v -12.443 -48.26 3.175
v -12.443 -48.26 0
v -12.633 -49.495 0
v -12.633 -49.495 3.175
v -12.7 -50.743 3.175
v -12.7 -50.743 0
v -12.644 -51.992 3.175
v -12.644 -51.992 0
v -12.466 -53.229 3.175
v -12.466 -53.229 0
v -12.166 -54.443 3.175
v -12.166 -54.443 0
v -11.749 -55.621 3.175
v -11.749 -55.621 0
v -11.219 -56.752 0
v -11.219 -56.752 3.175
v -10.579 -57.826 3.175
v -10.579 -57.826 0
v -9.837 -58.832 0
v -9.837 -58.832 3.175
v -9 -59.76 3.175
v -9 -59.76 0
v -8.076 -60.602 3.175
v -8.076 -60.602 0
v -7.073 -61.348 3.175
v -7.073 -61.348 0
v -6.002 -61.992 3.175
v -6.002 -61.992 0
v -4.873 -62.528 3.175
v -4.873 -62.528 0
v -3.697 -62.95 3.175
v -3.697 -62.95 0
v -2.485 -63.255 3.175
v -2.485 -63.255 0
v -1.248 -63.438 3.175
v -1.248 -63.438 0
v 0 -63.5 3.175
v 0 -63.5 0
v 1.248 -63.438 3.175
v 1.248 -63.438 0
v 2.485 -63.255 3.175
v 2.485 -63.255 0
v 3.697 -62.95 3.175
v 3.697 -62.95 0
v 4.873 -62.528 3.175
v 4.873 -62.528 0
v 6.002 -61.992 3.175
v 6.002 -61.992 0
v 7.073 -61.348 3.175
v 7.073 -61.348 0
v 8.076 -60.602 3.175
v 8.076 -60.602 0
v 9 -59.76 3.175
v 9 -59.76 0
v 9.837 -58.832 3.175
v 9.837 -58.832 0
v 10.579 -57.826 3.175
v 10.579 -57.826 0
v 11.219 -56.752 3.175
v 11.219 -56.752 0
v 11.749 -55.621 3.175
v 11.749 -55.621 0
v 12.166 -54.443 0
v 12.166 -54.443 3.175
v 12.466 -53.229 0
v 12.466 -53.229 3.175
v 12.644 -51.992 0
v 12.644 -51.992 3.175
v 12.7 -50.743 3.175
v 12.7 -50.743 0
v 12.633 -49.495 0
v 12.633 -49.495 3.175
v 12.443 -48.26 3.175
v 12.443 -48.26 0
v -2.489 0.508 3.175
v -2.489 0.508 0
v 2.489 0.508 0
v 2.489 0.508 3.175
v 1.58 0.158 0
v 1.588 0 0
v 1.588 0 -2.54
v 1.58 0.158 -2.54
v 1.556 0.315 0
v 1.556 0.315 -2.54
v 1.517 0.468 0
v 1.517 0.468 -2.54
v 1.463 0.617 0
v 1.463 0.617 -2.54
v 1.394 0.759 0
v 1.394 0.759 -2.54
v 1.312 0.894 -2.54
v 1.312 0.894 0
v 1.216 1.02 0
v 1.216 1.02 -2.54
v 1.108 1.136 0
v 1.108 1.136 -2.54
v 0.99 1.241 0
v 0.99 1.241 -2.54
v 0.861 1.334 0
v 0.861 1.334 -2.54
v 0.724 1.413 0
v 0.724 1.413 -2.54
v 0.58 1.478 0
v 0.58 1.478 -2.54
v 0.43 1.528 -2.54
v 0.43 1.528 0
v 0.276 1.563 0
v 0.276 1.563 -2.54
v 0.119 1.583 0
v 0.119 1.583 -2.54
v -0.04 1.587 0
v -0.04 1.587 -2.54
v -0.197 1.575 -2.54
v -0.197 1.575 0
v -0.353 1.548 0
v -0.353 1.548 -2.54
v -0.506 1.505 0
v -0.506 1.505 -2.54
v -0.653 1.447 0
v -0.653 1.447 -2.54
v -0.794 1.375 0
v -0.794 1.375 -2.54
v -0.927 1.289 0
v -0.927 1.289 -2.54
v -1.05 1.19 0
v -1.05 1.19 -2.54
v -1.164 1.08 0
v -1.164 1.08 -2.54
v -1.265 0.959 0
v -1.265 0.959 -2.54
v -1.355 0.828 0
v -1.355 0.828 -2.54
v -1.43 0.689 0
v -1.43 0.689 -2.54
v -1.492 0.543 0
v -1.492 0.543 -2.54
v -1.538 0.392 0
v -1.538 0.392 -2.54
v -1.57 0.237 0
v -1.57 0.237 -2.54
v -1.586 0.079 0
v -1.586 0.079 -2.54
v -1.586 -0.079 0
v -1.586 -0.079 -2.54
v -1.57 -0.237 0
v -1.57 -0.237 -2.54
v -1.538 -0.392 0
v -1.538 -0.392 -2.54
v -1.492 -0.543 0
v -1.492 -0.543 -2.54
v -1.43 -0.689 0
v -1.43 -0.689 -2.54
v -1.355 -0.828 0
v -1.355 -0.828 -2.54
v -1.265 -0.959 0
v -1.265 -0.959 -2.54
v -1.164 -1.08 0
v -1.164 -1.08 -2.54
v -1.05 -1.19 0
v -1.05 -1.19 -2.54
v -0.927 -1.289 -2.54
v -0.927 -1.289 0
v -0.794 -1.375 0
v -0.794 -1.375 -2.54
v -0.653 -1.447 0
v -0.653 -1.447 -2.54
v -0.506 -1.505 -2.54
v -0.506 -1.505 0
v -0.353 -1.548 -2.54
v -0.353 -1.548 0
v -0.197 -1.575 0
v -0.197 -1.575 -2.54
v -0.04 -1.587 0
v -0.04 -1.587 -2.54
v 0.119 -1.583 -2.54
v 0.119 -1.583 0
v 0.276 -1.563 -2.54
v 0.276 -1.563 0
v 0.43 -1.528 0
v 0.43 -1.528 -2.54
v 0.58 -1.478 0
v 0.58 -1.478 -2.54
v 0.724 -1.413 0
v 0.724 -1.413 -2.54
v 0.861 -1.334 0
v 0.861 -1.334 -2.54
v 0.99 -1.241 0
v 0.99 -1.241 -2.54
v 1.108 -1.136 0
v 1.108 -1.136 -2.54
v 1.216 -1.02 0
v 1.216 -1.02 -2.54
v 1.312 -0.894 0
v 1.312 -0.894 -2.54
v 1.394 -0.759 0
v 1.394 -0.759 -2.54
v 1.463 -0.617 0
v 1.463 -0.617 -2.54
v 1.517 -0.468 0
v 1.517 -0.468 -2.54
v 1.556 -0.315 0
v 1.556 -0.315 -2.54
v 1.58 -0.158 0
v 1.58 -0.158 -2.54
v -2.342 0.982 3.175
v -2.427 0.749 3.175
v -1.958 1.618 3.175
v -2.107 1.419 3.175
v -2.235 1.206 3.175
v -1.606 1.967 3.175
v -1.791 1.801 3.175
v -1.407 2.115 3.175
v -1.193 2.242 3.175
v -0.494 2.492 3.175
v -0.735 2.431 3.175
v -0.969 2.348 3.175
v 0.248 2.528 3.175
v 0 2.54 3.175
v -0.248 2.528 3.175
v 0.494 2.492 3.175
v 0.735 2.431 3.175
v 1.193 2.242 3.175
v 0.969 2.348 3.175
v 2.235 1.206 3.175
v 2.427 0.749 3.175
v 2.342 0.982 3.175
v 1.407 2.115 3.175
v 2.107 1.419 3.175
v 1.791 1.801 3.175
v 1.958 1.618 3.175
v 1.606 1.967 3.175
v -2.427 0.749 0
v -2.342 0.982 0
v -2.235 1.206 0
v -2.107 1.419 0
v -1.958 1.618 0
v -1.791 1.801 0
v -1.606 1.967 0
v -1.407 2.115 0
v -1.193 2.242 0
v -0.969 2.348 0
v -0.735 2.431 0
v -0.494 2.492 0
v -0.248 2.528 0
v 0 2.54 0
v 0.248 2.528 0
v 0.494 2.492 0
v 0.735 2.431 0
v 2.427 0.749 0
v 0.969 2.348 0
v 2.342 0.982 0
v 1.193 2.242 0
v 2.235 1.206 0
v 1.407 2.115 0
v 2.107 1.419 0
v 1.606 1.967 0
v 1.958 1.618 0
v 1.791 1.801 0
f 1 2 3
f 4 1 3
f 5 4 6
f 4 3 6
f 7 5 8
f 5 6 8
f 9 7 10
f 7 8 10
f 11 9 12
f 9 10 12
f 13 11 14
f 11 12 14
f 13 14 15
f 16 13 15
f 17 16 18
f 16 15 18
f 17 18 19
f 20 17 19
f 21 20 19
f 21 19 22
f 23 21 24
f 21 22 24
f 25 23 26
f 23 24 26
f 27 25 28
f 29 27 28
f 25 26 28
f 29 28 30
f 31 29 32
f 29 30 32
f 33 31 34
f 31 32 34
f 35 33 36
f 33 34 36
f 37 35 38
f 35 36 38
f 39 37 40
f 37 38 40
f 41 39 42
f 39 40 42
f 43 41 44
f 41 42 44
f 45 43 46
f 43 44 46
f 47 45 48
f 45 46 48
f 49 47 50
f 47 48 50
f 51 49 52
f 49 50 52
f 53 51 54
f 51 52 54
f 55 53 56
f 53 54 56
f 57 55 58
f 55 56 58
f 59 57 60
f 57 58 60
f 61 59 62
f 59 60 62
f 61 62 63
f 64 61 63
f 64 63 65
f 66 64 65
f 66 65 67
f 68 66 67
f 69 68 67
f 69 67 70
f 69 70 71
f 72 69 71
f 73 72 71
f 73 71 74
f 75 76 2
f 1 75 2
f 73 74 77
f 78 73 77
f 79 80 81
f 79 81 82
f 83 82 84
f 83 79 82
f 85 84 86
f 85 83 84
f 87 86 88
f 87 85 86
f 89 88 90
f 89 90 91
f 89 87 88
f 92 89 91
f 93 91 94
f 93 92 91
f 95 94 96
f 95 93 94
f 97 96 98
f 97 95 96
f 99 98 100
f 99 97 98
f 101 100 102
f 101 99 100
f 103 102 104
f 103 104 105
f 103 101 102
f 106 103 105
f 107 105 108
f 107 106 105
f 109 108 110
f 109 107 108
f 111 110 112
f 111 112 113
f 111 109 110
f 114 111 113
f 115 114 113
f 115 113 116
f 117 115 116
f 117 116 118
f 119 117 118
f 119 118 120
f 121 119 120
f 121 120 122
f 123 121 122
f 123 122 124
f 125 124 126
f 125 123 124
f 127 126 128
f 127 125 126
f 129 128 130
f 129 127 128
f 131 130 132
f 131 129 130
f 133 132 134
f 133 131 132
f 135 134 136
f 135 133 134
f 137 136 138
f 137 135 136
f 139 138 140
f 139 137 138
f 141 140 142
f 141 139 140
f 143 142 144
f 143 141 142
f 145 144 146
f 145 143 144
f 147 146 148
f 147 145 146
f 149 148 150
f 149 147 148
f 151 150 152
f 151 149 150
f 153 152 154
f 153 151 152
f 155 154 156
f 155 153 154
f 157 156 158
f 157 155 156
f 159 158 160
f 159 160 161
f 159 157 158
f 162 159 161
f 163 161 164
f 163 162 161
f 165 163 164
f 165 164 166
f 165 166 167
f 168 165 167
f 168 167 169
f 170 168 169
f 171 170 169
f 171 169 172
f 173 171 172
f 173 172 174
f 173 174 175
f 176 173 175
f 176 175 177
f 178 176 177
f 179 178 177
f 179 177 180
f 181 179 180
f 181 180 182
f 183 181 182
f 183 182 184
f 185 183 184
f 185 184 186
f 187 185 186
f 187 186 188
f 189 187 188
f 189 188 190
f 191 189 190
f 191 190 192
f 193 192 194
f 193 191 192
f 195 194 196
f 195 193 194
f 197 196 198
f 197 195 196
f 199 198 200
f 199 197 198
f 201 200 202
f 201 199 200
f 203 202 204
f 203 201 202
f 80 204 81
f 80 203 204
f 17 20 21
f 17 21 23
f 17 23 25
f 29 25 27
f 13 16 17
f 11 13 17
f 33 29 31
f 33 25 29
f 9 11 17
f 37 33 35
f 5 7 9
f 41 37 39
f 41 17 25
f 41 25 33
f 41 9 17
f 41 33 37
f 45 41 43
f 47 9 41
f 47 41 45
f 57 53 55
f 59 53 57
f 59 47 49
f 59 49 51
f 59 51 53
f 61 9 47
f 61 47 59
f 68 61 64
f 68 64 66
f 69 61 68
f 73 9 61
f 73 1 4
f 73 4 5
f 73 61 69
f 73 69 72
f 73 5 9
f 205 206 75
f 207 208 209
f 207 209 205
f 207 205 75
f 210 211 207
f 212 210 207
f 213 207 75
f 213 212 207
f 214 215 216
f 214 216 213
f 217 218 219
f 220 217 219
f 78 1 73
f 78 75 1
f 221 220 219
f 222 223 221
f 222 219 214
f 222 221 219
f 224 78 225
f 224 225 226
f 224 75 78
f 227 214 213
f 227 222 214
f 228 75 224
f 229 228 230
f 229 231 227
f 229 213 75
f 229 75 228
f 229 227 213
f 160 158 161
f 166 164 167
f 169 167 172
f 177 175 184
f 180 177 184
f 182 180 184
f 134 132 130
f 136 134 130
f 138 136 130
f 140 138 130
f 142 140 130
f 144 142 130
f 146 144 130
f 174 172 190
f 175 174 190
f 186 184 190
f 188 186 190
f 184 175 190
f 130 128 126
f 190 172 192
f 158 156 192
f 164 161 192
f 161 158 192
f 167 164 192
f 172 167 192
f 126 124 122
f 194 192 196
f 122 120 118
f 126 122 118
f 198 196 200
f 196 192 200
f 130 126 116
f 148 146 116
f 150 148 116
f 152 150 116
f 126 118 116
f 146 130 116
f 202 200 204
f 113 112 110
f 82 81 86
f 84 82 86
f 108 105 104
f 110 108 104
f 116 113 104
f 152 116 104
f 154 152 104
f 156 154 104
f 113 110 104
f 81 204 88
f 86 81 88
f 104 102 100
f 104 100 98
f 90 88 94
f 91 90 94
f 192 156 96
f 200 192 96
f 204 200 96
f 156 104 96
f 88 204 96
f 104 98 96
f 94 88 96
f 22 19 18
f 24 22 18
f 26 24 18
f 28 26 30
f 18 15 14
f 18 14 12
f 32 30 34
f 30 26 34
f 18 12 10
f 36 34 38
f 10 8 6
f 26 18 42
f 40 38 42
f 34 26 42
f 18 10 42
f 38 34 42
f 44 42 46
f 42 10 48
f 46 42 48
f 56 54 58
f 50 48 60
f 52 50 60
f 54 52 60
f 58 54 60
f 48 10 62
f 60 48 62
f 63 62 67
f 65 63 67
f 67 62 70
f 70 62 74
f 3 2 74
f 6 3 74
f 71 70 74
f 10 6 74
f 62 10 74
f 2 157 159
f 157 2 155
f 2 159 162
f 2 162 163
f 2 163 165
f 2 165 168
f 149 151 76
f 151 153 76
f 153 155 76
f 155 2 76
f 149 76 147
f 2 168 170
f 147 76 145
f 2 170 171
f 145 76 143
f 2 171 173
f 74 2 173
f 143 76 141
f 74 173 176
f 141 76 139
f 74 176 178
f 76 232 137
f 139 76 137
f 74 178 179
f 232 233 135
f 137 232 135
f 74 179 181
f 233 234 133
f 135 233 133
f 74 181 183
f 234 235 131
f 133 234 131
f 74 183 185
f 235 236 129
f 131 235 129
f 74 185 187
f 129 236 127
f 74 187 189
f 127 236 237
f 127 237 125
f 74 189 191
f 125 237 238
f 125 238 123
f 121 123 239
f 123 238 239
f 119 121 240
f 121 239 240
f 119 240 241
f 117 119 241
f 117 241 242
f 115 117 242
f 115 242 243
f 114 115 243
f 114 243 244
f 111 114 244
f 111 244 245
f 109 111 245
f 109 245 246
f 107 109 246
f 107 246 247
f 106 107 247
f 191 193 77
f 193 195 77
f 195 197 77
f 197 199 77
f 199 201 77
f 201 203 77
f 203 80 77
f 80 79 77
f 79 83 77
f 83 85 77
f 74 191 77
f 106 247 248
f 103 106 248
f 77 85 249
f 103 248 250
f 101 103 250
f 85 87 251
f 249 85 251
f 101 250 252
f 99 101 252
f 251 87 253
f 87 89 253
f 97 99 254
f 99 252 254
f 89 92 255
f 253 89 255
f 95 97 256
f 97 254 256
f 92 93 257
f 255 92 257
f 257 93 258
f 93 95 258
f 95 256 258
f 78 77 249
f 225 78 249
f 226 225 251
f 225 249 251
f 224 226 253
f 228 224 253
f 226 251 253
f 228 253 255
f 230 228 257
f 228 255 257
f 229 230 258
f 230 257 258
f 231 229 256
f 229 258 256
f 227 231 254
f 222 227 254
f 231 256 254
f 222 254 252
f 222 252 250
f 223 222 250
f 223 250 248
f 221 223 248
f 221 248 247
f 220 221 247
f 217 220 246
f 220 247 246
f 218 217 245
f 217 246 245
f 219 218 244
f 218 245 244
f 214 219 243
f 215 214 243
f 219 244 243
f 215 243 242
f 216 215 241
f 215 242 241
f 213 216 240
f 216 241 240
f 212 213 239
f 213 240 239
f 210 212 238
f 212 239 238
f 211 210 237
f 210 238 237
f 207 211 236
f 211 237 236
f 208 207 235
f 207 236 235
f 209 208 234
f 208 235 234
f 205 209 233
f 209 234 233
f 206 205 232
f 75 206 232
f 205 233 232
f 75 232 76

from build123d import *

# Parameters (mm, degrees)
F0_R     = 1.5875
F1_DEPTH = 3.175
F2_DEPTH = 2.54


with BuildPart() as f1:
    # F0 (on Top) → F1 (new body)
    with BuildSketch(Plane.XY):
        with BuildLine():
            Line((12.443408, -48.26), (2.488682, 0.508))
            ThreePointArc((2.488682, 0.508), (0, 2.54), (-2.488682, 0.508))
            Line((-2.488682, 0.508), (-12.443408, -48.26))
            ThreePointArc((-12.443408, -48.26), (0, -63.5), (12.443408, -48.26))
        make_face()
        Circle(F0_R, mode=Mode.SUBTRACT)
        Circle(F0_R)
    extrude(amount=F1_DEPTH)

    # F0 (on Top) → F2 (join)
    with BuildSketch(Plane.XY):
        Circle(F0_R)
    extrude(amount=-F2_DEPTH)


solid = f1.part
